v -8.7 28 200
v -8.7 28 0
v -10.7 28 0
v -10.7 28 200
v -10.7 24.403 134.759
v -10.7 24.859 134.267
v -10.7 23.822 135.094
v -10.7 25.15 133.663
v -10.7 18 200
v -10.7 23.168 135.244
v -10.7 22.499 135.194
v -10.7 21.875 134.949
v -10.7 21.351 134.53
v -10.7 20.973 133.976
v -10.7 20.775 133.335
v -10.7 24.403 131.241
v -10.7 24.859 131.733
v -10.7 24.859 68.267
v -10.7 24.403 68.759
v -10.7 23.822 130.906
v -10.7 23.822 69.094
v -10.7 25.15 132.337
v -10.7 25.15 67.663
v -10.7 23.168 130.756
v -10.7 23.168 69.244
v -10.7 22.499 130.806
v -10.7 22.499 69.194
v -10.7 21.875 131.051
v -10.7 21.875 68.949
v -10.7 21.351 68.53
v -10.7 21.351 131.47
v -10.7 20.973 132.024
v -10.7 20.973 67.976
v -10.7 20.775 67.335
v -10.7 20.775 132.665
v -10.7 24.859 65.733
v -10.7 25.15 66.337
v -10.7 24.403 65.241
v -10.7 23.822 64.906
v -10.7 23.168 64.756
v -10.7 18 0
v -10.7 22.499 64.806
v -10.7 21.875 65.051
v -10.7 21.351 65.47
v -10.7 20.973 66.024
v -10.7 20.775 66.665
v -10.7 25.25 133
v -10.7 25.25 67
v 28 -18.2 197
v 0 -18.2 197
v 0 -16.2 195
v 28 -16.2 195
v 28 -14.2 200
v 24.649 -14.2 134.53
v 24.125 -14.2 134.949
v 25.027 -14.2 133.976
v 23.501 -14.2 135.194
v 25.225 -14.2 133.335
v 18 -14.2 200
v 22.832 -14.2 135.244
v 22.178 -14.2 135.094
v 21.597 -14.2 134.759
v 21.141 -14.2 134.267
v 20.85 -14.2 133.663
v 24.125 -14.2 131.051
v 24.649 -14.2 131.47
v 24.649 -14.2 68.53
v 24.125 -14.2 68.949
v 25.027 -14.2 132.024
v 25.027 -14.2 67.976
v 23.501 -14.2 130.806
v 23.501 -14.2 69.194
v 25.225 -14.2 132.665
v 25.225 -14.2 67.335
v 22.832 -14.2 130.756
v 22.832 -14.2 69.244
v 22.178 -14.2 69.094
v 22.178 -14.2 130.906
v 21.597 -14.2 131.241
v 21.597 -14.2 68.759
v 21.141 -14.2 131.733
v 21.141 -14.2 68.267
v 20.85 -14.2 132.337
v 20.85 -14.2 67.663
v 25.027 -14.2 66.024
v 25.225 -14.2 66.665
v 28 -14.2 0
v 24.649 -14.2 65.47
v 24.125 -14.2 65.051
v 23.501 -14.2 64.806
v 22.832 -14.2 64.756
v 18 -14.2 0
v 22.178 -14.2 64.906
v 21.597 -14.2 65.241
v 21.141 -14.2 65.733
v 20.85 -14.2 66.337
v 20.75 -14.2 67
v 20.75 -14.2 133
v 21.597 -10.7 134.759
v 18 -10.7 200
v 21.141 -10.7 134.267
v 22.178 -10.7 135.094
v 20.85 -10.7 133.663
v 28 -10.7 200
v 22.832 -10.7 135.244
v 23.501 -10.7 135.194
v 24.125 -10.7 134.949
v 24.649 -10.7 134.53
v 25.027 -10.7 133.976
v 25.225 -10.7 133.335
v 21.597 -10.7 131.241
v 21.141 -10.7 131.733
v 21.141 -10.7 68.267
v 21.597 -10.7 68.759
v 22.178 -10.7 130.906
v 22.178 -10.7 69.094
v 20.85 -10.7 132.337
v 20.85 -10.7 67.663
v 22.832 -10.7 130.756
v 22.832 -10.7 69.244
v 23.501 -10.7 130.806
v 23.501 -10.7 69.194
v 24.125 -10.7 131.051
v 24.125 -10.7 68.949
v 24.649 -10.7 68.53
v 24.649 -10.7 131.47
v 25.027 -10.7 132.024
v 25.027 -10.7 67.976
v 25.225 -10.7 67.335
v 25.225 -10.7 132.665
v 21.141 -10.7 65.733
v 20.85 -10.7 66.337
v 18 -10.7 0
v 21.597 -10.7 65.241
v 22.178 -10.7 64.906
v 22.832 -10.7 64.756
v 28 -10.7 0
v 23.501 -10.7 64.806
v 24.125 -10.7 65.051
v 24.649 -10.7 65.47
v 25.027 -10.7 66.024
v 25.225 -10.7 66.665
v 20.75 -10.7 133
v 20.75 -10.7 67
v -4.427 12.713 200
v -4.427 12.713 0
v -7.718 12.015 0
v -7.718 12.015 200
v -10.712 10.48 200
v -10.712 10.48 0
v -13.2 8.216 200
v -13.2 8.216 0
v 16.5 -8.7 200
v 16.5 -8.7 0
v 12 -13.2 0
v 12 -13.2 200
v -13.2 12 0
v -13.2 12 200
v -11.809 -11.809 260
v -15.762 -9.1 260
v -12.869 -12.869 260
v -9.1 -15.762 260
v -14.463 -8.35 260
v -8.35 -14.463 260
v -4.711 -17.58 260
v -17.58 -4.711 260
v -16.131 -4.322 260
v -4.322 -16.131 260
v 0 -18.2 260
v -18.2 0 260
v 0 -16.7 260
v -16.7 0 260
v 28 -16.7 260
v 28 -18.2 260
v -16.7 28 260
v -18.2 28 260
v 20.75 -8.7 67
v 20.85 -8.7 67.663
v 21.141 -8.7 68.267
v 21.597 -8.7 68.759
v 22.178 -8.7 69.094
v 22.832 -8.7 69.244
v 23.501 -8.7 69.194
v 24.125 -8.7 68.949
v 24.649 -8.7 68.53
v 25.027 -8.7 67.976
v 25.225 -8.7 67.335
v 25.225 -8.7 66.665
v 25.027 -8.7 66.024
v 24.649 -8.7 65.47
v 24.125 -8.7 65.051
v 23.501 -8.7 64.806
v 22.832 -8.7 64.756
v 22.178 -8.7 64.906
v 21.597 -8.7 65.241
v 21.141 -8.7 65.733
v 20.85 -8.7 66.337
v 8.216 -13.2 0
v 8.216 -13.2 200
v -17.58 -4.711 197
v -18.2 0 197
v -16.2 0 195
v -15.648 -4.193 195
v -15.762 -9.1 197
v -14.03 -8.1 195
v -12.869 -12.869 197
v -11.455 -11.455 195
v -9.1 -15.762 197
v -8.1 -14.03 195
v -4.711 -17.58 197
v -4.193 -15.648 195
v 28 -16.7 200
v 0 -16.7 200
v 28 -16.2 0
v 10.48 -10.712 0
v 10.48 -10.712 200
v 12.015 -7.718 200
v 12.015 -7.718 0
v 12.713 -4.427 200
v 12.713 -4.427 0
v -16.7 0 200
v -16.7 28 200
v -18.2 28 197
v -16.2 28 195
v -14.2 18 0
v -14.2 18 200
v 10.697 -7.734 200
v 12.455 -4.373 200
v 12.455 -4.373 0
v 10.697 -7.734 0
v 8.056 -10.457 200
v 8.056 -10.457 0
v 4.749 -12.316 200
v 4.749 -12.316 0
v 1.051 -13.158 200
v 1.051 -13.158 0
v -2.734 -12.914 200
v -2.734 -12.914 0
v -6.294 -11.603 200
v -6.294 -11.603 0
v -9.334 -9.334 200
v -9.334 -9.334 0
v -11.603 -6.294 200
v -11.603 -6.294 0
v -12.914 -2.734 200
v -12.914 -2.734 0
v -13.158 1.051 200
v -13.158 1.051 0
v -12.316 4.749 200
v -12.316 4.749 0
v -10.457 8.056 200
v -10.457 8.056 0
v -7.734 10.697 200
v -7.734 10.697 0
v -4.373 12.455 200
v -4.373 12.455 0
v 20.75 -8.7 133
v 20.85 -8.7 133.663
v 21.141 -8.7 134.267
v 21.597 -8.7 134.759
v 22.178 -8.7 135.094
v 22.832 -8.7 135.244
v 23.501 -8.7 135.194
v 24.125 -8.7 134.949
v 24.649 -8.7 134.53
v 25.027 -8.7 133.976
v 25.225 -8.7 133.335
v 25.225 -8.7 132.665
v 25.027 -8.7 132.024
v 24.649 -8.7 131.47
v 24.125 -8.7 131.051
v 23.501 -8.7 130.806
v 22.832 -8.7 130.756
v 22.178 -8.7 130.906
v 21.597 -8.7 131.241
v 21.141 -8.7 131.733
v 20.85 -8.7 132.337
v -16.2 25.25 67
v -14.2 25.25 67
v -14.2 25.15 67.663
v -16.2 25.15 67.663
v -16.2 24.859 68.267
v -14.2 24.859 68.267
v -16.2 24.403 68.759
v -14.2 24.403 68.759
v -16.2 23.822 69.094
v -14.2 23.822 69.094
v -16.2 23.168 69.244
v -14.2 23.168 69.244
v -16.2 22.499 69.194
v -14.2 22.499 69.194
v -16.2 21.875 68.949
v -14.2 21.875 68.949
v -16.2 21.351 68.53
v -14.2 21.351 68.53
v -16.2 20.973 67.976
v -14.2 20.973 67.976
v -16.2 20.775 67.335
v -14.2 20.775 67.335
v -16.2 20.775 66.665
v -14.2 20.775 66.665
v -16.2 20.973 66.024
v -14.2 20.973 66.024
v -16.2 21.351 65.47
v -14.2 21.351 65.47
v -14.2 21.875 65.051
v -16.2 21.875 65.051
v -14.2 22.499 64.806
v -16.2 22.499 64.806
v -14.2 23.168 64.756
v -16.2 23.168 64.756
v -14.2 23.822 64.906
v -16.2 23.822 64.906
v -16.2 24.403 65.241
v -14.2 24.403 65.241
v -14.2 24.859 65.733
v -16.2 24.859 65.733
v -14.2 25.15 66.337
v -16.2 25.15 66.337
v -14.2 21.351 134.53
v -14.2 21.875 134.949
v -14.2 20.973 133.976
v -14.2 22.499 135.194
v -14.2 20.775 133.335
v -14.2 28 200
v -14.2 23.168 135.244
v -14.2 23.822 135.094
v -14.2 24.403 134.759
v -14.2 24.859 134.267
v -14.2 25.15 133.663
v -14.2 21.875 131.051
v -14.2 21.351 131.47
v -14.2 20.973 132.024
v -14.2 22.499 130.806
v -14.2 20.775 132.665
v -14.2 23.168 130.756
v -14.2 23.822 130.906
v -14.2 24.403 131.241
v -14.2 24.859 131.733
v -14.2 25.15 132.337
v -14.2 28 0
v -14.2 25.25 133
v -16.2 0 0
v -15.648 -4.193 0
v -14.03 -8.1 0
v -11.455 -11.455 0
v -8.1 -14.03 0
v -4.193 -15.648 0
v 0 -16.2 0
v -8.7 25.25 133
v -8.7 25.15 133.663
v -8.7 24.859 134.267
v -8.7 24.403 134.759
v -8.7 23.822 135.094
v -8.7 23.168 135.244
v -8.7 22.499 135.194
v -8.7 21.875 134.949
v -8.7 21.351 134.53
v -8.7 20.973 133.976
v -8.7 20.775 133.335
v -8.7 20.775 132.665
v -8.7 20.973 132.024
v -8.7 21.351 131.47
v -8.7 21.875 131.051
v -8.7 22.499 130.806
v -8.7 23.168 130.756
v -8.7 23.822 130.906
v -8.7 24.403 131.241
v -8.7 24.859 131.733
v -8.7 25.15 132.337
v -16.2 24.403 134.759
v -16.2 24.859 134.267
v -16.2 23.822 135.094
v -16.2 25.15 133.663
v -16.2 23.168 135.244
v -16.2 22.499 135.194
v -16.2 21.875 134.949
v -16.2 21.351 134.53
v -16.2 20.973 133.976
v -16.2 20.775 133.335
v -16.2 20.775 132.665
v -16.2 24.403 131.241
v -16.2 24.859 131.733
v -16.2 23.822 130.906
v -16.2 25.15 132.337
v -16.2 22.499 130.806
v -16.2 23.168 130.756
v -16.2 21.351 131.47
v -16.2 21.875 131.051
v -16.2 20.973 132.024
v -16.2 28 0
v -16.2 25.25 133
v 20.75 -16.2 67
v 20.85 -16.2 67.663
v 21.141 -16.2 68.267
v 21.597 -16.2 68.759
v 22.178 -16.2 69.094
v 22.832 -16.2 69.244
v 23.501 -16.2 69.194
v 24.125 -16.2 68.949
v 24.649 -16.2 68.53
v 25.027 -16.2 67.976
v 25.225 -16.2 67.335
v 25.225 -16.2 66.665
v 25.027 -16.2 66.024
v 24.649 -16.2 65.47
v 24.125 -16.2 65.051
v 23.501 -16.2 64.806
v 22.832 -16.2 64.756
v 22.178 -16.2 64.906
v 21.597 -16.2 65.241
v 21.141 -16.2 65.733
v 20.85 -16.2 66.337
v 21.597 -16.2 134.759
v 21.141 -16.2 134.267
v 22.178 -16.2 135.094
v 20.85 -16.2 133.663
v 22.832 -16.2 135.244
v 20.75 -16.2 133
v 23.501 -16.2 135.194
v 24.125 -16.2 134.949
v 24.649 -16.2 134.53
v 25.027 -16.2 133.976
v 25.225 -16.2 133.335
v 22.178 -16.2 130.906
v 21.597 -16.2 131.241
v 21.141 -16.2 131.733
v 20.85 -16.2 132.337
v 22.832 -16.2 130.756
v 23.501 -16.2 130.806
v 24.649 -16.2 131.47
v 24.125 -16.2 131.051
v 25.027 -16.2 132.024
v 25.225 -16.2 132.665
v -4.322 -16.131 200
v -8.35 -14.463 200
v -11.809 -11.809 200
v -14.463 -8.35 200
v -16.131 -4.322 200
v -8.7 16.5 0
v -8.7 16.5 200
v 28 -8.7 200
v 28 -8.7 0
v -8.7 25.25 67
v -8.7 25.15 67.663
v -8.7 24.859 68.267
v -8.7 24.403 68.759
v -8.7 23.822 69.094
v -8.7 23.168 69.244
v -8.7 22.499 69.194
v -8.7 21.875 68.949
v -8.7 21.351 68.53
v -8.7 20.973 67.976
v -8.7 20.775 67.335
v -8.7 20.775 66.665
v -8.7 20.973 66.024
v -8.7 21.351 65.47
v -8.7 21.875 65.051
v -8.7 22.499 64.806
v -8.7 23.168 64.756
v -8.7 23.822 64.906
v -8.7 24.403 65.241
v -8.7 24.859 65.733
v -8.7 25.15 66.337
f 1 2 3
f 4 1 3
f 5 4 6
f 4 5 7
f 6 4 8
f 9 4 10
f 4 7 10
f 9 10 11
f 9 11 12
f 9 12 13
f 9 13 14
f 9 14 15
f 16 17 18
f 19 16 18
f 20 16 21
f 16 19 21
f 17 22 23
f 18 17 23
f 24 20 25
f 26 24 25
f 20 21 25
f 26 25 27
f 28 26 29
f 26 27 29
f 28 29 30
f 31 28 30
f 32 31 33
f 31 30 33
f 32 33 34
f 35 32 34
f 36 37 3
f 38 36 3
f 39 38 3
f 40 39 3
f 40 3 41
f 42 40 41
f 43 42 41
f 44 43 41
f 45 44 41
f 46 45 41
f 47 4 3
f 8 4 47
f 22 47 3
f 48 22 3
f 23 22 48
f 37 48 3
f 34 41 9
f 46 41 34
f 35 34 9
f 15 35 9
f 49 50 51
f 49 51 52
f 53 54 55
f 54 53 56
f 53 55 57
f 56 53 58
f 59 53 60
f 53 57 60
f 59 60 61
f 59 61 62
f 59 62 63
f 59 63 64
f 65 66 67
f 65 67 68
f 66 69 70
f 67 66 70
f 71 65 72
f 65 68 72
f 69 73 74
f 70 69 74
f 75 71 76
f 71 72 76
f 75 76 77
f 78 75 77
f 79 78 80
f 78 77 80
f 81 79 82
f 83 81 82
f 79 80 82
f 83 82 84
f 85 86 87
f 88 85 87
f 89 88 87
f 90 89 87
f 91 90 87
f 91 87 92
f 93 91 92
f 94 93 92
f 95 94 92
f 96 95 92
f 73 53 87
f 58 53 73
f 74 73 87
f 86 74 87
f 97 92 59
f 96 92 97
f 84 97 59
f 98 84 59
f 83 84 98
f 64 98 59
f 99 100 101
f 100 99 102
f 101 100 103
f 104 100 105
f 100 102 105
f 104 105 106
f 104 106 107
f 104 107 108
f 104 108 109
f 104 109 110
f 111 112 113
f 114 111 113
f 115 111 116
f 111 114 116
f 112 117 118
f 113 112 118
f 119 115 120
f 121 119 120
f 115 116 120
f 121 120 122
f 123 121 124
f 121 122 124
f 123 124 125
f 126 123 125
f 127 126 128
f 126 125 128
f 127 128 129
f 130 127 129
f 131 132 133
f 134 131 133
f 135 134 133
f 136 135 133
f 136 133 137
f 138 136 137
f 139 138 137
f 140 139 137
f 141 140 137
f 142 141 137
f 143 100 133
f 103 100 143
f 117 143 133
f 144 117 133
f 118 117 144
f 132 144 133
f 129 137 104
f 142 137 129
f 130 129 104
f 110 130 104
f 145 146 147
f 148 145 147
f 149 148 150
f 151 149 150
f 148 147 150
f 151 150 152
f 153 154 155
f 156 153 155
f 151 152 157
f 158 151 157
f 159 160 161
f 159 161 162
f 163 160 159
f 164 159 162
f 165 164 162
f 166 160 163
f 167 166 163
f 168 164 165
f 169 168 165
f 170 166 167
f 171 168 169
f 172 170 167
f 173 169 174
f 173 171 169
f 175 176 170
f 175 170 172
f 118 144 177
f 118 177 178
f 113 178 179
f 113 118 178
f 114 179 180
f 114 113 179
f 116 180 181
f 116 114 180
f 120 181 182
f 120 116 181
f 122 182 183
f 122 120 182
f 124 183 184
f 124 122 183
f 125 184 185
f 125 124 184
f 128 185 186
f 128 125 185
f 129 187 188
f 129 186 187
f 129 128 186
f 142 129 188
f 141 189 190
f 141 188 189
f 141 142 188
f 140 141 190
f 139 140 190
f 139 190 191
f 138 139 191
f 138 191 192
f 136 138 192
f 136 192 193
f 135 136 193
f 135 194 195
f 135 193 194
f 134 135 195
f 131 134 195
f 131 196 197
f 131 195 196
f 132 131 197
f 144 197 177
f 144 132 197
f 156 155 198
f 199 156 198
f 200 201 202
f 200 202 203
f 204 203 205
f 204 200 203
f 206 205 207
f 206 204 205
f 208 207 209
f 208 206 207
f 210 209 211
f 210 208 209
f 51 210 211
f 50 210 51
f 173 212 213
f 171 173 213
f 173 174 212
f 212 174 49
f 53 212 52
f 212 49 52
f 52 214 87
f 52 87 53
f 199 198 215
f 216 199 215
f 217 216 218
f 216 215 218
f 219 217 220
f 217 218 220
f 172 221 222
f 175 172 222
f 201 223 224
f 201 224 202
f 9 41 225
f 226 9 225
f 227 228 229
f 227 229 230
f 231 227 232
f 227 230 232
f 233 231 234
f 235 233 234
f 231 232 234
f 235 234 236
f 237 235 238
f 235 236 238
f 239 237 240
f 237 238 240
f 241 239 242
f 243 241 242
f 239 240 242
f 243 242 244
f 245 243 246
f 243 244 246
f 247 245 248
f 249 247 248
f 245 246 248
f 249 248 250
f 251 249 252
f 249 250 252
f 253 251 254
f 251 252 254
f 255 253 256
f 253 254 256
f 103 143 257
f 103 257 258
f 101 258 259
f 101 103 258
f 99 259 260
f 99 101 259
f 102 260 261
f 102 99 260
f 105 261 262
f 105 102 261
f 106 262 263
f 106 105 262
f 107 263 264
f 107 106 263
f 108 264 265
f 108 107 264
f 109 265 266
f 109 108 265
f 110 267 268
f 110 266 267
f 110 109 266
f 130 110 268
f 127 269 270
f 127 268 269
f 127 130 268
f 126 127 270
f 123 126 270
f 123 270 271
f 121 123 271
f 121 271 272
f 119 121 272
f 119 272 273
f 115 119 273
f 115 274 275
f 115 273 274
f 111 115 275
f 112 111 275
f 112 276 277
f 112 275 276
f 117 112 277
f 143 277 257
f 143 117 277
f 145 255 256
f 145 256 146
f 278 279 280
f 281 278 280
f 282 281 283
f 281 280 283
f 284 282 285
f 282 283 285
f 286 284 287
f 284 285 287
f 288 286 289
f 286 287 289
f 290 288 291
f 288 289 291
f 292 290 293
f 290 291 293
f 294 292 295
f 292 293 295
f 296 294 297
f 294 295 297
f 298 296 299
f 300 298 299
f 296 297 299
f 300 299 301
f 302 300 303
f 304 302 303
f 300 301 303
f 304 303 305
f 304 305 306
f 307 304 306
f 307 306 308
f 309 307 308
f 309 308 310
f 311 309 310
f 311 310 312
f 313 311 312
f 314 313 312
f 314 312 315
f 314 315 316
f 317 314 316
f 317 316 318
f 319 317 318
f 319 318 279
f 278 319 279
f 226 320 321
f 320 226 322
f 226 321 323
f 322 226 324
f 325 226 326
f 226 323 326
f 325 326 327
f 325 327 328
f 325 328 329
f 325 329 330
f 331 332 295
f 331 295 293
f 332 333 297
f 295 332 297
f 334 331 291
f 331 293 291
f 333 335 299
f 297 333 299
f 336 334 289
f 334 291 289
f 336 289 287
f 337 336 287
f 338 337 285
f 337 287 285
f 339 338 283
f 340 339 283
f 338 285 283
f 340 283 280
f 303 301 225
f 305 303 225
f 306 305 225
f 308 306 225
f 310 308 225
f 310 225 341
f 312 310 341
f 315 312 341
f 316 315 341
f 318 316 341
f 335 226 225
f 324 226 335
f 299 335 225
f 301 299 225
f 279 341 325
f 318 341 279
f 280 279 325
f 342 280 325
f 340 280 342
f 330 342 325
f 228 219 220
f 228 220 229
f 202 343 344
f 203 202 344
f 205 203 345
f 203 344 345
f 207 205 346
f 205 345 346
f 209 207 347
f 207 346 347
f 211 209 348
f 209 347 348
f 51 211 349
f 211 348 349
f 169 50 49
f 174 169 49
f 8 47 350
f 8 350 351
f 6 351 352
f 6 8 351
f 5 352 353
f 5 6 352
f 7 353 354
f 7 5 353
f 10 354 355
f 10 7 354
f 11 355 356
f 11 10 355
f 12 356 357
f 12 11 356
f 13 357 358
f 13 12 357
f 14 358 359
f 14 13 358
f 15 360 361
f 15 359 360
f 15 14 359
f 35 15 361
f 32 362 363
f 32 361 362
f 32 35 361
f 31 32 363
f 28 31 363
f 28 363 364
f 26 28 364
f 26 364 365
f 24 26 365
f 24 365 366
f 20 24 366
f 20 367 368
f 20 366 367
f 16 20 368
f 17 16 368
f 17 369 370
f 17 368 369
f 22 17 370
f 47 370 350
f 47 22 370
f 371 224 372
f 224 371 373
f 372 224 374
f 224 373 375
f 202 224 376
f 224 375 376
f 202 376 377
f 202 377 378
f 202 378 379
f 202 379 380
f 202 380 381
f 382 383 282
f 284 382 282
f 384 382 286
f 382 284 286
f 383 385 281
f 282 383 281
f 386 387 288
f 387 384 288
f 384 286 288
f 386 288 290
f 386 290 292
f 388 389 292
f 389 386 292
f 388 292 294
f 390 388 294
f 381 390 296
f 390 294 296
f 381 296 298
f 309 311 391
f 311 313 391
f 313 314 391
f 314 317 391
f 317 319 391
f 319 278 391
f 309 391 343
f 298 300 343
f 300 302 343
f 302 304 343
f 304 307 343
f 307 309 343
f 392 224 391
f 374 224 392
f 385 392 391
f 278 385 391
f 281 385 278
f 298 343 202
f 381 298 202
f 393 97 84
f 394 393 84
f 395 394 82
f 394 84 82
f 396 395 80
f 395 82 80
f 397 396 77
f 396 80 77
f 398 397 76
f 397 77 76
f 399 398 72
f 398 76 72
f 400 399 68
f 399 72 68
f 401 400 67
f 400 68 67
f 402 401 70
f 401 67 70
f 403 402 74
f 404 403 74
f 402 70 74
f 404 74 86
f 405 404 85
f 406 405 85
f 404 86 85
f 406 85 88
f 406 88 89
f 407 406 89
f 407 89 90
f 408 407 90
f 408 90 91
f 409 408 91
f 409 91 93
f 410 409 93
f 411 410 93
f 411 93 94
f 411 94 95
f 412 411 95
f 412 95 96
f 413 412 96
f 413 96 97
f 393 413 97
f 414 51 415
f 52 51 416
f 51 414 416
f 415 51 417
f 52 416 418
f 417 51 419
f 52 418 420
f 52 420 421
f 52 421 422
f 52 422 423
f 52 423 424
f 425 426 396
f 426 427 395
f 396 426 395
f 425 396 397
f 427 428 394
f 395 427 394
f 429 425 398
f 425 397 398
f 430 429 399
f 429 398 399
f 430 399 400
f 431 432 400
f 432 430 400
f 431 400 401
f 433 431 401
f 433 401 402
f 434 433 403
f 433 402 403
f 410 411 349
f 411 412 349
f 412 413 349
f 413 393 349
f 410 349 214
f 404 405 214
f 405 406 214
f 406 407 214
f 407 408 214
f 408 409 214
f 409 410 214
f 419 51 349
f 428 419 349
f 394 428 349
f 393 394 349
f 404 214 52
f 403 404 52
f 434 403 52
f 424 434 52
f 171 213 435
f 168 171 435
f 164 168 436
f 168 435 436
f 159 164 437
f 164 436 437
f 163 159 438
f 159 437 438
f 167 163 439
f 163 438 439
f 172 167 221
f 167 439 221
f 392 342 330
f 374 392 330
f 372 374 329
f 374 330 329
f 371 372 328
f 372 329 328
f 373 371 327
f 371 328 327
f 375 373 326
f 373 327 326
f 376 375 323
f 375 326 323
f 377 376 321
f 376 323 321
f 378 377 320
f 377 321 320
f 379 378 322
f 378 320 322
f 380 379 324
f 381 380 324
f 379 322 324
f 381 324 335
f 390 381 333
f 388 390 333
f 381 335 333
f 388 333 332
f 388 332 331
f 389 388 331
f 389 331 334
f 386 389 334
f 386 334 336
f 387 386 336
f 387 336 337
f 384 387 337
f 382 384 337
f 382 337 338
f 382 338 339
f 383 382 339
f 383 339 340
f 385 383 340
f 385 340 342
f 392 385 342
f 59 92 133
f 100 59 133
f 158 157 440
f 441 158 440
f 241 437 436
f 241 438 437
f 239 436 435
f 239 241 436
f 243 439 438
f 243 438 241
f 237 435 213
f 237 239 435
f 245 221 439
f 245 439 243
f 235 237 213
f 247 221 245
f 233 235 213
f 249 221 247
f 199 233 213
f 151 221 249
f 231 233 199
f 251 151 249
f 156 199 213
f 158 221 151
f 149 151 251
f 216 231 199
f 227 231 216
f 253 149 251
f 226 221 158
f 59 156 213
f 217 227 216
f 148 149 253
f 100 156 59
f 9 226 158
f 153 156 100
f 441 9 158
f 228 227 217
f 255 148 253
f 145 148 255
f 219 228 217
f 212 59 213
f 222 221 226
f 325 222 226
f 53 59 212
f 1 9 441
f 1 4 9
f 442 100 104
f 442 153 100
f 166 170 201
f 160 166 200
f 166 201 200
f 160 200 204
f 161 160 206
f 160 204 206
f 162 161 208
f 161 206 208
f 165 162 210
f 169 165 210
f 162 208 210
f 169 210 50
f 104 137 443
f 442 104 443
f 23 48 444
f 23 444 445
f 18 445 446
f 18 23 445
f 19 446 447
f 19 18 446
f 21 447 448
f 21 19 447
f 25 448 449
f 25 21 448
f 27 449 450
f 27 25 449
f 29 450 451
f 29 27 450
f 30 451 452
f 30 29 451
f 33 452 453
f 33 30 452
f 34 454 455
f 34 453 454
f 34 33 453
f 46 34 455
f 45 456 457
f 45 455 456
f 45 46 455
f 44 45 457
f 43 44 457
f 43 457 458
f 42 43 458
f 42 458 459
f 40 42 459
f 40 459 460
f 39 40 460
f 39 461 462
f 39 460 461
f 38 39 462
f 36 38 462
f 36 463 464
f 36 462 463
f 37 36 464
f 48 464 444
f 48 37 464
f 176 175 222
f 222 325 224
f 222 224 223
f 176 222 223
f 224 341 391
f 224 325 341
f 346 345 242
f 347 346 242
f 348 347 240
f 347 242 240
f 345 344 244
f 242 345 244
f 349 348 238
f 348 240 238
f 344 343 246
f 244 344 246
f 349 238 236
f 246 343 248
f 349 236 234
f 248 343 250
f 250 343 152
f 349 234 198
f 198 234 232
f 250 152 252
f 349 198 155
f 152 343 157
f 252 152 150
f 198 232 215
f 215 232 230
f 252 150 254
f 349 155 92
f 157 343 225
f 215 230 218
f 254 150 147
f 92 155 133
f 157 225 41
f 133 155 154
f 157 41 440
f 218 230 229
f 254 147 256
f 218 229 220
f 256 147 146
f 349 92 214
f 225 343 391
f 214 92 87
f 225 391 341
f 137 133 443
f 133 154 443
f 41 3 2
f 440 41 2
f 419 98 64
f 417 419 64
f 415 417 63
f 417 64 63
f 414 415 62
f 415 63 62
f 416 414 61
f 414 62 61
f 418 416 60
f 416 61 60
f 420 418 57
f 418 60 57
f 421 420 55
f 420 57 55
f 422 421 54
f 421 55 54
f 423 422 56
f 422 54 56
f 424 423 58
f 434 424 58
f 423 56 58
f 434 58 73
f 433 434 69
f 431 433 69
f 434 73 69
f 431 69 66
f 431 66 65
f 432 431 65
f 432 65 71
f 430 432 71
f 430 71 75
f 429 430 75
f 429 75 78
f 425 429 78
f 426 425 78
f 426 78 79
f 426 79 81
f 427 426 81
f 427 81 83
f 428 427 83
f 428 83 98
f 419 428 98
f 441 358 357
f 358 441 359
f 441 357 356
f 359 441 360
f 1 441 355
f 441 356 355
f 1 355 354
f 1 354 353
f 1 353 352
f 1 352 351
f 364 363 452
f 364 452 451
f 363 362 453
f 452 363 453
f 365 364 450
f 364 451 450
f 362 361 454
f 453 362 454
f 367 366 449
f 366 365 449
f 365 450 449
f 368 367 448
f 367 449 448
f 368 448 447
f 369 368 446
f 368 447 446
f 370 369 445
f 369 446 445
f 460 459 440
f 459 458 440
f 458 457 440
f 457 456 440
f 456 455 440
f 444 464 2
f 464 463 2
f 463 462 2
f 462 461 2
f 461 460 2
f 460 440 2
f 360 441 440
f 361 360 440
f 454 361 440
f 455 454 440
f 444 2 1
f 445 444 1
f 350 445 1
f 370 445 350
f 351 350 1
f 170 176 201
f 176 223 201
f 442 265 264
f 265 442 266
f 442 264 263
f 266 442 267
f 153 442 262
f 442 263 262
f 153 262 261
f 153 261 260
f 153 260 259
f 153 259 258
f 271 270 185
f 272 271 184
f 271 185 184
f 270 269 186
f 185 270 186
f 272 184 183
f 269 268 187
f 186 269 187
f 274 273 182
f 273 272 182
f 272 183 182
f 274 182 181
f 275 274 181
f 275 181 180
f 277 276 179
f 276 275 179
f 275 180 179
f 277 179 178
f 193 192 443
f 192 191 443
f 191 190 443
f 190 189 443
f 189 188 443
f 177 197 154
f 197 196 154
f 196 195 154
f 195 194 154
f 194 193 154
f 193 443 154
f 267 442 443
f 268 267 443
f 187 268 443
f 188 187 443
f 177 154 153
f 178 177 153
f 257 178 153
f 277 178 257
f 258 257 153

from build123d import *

# Parameters (mm, degrees)
F1_DEPTH       = 200
F2_T1_DEPTH    = 205.0938285461
F4_DEPTH       = 5
F5_SIZE        = 1.99999
F6_DEPTH       = 60
F7_R           = 2.25
F8_DEPTH       = 25
F8_DEPTH_BACK  = 25
F9_R           = 2.25
F10_DEPTH      = 25
F10_DEPTH_BACK = 25


# Not quite as in the source:
# - a fillet or chamfer that OpenCascade refuses, or shapes differently, is made with other operations: its cross-section is extruded or revolved along the edge and cut away or added
# - a fillet or chamfer is up to 0.001 mm smaller than in the source, because OpenCascade refuses the exact size


with BuildPart() as f1:
    # F0 (on Top) → F1 (new body)
    with BuildSketch(Plane.XY):
        with BuildLine():
            ThreePointArc((-13.2, 8.2159349274), (-15.426540085, 4.3732592746), (-16.2, 0))
            ThreePointArc((-16.2, 0), (-11.4551298552, -11.4551298552), (0, -16.2))
            ThreePointArc((0, -16.2), (4.3732592746, -15.426540085), (8.2159349274, -13.2))
            Line((8.2159349274, -13.2), (0, -13.2))
            ThreePointArc((0, -13.2), (-9.3338095117, -9.3338095117), (-13.2, 0))
            Line((-13.2, 0), (-13.2, 8.2159349274))
        make_face()
        with BuildLine():
            Line((-16.2, 12), (-16.2, 0))
            ThreePointArc((-16.2, 0), (-15.426540085, 4.3732592746), (-13.2, 8.2159349274))
            Line((-13.2, 8.2159349274), (-13.2, 12))
            Line((-13.2, 12), (-8.7, 16.5))
            Line((-8.7, 16.5), (-8.7, 28))
            Line((-8.7, 28), (-10.7, 28))
            Line((-10.7, 28), (-10.7, 18))
            Line((-10.7, 18), (-14.2, 18))
            Line((-14.2, 18), (-14.2, 28))
            Line((-14.2, 28), (-16.2, 28))
            Line((-16.2, 28), (-16.2, 12))
        make_face()
        with BuildLine():
            ThreePointArc((8.2159349274, -13.2), (4.3732592746, -15.426540085), (0, -16.2))
            Line((0, -16.2), (12, -16.2))
            Line((12, -16.2), (28, -16.2))
            Line((28, -16.2), (28, -14.2))
            Line((28, -14.2), (18, -14.2))
            Line((18, -14.2), (18, -10.7))
            Line((18, -10.7), (28, -10.7))
            Line((28, -10.7), (28, -8.7))
            Line((28, -8.7), (16.5, -8.7))
            Line((16.5, -8.7), (12, -13.2))
            Line((12, -13.2), (8.2159349274, -13.2))
        make_face()
        with BuildLine():
            ThreePointArc((-3.4164113954, 12.750220907), (-8.8111411033, 11.568257177), (-13.2, 8.2159349274))
            Line((-13.2, 8.2159349274), (-13.2, 0))
            ThreePointArc((-13.2, 0), (-10.4722640918, 8.0356508629), (-3.4164113954, 12.750220907))
        make_face()
        with BuildLine():
            Line((0, -13.2), (8.2159349274, -13.2))
            ThreePointArc((8.2159349274, -13.2), (11.568257177, -8.8111411033), (12.750220907, -3.4164113954))
            ThreePointArc((12.750220907, -3.4164113954), (8.0356508629, -10.4722640918), (0, -13.2))
        make_face()
    extrude(amount=F1_DEPTH)

    # F2: chamfer of 1 on 2 edges, made by hand

    # F2_s2 → F2_t1 (cut)
    with BuildSketch(Plane.XY.offset(-2.546914273)):
        with BuildLine():
            Line((-4.3644750665, 12.4155520043), (-4.4351757111, 12.7519059003))
            Line((-4.4351757111, 12.7519059003), (-4.436708561, 12.7718470731))
            ThreePointArc((-4.436708561, 12.7718470731), (-3.9261784824, 12.7613736088), (-3.4163591233, 12.7702208387))
            Line((-3.4163591233, 12.7702208387), (-3.4112350145, 12.7309023905))
            ThreePointArc((-3.4112350145, 12.7309023905), (-3.893221277, 12.5918715086), (-4.3578497587, 12.3966812519))
            Line((-4.3578497587, 12.3966812519), (-4.3644750665, 12.4155520043))
        make_face()
        with BuildLine():
            Line((12.7519059003, -4.4351757111), (12.4155520043, -4.3644750665))
            Line((12.4155520043, -4.3644750665), (12.3966812519, -4.3578497587))
            ThreePointArc((12.3966812519, -4.3578497587), (12.5918715086, -3.893221277), (12.7309023905, -3.4112350145))
            Line((12.7309023905, -3.4112350145), (12.7702208387, -3.4163591233))
            ThreePointArc((12.7702208387, -3.4163591233), (12.7613736088, -3.9261784824), (12.7718470731, -4.436708561))
            Line((12.7718470731, -4.436708561), (12.7519059003, -4.4351757111))
        make_face()
    extrude(amount=F2_T1_DEPTH, mode=Mode.SUBTRACT)

    # F3 (on face) → F4 (join)
    with BuildSketch(Plane.XY.offset(200)):
        with BuildLine():
            Line((28, -16.7), (28, -16.2))
            Line((28, -16.2), (0, -16.2))
            ThreePointArc((0, -16.2), (-11.4551298552, -11.4551298552), (-16.2, 0))
            Line((-16.2, 0), (-16.2, 28))
            Line((-16.2, 28), (-16.7, 28))
            Line((-16.7, 28), (-16.7, 0))
            ThreePointArc((-16.7, 0), (-11.8086832458, -11.8086832458), (0, -16.7))
            Line((0, -16.7), (28, -16.7))
        make_face()
        with BuildLine():
            Line((28, -18.2), (28, -16.7))
            Line((28, -16.7), (0, -16.7))
            ThreePointArc((0, -16.7), (-11.8086832458, -11.8086832458), (-16.7, 0))
            Line((-16.7, 0), (-16.7, 28))
            Line((-16.7, 28), (-18.2, 28))
            Line((-18.2, 28), (-18.2, 0))
            ThreePointArc((-18.2, 0), (-12.8693434176, -12.8693434176), (0, -18.2))
            Line((0, -18.2), (28, -18.2))
        make_face()
    extrude(amount=-F4_DEPTH)

    # F5 (size 2 in the source; OpenCascade refuses exactly that, so slightly less here)
    f5_edges = [f1.edges().sort_by_distance(p)[0] for p in [
        (-18.2, 14, 195),
        (-12.869343, -12.869343, 195),
        (14, -18.2, 195),
    ]]
    chamfer(f5_edges, length=F5_SIZE)

    # F3 (on face) → F6 (join)
    with BuildSketch(Plane.XY.offset(200)):
        with BuildLine():
            Line((28, -18.2), (28, -16.7))
            Line((28, -16.7), (0, -16.7))
            ThreePointArc((0, -16.7), (-11.8086832458, -11.8086832458), (-16.7, 0))
            Line((-16.7, 0), (-16.7, 28))
            Line((-16.7, 28), (-18.2, 28))
            Line((-18.2, 28), (-18.2, 0))
            ThreePointArc((-18.2, 0), (-12.8693434176, -12.8693434176), (0, -18.2))
            Line((0, -18.2), (28, -18.2))
        make_face()
    extrude(amount=F6_DEPTH)

    # F7 (on face) → F8 (cut, two sides)
    with BuildSketch(Plane(origin=(0, -14.2, 0), x_dir=(-1, 0, 0), z_dir=(0, 1, 0))) as f8_sk:
        with Locations((-23, 133)):
            Circle(F7_R)
        with Locations((-23, 67)):
            Circle(F7_R)
    extrude(amount=-F8_DEPTH, mode=Mode.SUBTRACT)
    extrude(f8_sk.sketch, amount=F8_DEPTH_BACK, mode=Mode.SUBTRACT)

    # F9 (on face) → F10 (cut, two sides)
    with BuildSketch(Plane.YZ.offset(-14.2)) as f10_sk:
        with Locations((23, 133)):
            Circle(F9_R)
        with Locations((23, 67)):
            Circle(F9_R)
    extrude(amount=-F10_DEPTH, mode=Mode.SUBTRACT)
    extrude(f10_sk.sketch, amount=F10_DEPTH_BACK, mode=Mode.SUBTRACT)


solid = f1.part
